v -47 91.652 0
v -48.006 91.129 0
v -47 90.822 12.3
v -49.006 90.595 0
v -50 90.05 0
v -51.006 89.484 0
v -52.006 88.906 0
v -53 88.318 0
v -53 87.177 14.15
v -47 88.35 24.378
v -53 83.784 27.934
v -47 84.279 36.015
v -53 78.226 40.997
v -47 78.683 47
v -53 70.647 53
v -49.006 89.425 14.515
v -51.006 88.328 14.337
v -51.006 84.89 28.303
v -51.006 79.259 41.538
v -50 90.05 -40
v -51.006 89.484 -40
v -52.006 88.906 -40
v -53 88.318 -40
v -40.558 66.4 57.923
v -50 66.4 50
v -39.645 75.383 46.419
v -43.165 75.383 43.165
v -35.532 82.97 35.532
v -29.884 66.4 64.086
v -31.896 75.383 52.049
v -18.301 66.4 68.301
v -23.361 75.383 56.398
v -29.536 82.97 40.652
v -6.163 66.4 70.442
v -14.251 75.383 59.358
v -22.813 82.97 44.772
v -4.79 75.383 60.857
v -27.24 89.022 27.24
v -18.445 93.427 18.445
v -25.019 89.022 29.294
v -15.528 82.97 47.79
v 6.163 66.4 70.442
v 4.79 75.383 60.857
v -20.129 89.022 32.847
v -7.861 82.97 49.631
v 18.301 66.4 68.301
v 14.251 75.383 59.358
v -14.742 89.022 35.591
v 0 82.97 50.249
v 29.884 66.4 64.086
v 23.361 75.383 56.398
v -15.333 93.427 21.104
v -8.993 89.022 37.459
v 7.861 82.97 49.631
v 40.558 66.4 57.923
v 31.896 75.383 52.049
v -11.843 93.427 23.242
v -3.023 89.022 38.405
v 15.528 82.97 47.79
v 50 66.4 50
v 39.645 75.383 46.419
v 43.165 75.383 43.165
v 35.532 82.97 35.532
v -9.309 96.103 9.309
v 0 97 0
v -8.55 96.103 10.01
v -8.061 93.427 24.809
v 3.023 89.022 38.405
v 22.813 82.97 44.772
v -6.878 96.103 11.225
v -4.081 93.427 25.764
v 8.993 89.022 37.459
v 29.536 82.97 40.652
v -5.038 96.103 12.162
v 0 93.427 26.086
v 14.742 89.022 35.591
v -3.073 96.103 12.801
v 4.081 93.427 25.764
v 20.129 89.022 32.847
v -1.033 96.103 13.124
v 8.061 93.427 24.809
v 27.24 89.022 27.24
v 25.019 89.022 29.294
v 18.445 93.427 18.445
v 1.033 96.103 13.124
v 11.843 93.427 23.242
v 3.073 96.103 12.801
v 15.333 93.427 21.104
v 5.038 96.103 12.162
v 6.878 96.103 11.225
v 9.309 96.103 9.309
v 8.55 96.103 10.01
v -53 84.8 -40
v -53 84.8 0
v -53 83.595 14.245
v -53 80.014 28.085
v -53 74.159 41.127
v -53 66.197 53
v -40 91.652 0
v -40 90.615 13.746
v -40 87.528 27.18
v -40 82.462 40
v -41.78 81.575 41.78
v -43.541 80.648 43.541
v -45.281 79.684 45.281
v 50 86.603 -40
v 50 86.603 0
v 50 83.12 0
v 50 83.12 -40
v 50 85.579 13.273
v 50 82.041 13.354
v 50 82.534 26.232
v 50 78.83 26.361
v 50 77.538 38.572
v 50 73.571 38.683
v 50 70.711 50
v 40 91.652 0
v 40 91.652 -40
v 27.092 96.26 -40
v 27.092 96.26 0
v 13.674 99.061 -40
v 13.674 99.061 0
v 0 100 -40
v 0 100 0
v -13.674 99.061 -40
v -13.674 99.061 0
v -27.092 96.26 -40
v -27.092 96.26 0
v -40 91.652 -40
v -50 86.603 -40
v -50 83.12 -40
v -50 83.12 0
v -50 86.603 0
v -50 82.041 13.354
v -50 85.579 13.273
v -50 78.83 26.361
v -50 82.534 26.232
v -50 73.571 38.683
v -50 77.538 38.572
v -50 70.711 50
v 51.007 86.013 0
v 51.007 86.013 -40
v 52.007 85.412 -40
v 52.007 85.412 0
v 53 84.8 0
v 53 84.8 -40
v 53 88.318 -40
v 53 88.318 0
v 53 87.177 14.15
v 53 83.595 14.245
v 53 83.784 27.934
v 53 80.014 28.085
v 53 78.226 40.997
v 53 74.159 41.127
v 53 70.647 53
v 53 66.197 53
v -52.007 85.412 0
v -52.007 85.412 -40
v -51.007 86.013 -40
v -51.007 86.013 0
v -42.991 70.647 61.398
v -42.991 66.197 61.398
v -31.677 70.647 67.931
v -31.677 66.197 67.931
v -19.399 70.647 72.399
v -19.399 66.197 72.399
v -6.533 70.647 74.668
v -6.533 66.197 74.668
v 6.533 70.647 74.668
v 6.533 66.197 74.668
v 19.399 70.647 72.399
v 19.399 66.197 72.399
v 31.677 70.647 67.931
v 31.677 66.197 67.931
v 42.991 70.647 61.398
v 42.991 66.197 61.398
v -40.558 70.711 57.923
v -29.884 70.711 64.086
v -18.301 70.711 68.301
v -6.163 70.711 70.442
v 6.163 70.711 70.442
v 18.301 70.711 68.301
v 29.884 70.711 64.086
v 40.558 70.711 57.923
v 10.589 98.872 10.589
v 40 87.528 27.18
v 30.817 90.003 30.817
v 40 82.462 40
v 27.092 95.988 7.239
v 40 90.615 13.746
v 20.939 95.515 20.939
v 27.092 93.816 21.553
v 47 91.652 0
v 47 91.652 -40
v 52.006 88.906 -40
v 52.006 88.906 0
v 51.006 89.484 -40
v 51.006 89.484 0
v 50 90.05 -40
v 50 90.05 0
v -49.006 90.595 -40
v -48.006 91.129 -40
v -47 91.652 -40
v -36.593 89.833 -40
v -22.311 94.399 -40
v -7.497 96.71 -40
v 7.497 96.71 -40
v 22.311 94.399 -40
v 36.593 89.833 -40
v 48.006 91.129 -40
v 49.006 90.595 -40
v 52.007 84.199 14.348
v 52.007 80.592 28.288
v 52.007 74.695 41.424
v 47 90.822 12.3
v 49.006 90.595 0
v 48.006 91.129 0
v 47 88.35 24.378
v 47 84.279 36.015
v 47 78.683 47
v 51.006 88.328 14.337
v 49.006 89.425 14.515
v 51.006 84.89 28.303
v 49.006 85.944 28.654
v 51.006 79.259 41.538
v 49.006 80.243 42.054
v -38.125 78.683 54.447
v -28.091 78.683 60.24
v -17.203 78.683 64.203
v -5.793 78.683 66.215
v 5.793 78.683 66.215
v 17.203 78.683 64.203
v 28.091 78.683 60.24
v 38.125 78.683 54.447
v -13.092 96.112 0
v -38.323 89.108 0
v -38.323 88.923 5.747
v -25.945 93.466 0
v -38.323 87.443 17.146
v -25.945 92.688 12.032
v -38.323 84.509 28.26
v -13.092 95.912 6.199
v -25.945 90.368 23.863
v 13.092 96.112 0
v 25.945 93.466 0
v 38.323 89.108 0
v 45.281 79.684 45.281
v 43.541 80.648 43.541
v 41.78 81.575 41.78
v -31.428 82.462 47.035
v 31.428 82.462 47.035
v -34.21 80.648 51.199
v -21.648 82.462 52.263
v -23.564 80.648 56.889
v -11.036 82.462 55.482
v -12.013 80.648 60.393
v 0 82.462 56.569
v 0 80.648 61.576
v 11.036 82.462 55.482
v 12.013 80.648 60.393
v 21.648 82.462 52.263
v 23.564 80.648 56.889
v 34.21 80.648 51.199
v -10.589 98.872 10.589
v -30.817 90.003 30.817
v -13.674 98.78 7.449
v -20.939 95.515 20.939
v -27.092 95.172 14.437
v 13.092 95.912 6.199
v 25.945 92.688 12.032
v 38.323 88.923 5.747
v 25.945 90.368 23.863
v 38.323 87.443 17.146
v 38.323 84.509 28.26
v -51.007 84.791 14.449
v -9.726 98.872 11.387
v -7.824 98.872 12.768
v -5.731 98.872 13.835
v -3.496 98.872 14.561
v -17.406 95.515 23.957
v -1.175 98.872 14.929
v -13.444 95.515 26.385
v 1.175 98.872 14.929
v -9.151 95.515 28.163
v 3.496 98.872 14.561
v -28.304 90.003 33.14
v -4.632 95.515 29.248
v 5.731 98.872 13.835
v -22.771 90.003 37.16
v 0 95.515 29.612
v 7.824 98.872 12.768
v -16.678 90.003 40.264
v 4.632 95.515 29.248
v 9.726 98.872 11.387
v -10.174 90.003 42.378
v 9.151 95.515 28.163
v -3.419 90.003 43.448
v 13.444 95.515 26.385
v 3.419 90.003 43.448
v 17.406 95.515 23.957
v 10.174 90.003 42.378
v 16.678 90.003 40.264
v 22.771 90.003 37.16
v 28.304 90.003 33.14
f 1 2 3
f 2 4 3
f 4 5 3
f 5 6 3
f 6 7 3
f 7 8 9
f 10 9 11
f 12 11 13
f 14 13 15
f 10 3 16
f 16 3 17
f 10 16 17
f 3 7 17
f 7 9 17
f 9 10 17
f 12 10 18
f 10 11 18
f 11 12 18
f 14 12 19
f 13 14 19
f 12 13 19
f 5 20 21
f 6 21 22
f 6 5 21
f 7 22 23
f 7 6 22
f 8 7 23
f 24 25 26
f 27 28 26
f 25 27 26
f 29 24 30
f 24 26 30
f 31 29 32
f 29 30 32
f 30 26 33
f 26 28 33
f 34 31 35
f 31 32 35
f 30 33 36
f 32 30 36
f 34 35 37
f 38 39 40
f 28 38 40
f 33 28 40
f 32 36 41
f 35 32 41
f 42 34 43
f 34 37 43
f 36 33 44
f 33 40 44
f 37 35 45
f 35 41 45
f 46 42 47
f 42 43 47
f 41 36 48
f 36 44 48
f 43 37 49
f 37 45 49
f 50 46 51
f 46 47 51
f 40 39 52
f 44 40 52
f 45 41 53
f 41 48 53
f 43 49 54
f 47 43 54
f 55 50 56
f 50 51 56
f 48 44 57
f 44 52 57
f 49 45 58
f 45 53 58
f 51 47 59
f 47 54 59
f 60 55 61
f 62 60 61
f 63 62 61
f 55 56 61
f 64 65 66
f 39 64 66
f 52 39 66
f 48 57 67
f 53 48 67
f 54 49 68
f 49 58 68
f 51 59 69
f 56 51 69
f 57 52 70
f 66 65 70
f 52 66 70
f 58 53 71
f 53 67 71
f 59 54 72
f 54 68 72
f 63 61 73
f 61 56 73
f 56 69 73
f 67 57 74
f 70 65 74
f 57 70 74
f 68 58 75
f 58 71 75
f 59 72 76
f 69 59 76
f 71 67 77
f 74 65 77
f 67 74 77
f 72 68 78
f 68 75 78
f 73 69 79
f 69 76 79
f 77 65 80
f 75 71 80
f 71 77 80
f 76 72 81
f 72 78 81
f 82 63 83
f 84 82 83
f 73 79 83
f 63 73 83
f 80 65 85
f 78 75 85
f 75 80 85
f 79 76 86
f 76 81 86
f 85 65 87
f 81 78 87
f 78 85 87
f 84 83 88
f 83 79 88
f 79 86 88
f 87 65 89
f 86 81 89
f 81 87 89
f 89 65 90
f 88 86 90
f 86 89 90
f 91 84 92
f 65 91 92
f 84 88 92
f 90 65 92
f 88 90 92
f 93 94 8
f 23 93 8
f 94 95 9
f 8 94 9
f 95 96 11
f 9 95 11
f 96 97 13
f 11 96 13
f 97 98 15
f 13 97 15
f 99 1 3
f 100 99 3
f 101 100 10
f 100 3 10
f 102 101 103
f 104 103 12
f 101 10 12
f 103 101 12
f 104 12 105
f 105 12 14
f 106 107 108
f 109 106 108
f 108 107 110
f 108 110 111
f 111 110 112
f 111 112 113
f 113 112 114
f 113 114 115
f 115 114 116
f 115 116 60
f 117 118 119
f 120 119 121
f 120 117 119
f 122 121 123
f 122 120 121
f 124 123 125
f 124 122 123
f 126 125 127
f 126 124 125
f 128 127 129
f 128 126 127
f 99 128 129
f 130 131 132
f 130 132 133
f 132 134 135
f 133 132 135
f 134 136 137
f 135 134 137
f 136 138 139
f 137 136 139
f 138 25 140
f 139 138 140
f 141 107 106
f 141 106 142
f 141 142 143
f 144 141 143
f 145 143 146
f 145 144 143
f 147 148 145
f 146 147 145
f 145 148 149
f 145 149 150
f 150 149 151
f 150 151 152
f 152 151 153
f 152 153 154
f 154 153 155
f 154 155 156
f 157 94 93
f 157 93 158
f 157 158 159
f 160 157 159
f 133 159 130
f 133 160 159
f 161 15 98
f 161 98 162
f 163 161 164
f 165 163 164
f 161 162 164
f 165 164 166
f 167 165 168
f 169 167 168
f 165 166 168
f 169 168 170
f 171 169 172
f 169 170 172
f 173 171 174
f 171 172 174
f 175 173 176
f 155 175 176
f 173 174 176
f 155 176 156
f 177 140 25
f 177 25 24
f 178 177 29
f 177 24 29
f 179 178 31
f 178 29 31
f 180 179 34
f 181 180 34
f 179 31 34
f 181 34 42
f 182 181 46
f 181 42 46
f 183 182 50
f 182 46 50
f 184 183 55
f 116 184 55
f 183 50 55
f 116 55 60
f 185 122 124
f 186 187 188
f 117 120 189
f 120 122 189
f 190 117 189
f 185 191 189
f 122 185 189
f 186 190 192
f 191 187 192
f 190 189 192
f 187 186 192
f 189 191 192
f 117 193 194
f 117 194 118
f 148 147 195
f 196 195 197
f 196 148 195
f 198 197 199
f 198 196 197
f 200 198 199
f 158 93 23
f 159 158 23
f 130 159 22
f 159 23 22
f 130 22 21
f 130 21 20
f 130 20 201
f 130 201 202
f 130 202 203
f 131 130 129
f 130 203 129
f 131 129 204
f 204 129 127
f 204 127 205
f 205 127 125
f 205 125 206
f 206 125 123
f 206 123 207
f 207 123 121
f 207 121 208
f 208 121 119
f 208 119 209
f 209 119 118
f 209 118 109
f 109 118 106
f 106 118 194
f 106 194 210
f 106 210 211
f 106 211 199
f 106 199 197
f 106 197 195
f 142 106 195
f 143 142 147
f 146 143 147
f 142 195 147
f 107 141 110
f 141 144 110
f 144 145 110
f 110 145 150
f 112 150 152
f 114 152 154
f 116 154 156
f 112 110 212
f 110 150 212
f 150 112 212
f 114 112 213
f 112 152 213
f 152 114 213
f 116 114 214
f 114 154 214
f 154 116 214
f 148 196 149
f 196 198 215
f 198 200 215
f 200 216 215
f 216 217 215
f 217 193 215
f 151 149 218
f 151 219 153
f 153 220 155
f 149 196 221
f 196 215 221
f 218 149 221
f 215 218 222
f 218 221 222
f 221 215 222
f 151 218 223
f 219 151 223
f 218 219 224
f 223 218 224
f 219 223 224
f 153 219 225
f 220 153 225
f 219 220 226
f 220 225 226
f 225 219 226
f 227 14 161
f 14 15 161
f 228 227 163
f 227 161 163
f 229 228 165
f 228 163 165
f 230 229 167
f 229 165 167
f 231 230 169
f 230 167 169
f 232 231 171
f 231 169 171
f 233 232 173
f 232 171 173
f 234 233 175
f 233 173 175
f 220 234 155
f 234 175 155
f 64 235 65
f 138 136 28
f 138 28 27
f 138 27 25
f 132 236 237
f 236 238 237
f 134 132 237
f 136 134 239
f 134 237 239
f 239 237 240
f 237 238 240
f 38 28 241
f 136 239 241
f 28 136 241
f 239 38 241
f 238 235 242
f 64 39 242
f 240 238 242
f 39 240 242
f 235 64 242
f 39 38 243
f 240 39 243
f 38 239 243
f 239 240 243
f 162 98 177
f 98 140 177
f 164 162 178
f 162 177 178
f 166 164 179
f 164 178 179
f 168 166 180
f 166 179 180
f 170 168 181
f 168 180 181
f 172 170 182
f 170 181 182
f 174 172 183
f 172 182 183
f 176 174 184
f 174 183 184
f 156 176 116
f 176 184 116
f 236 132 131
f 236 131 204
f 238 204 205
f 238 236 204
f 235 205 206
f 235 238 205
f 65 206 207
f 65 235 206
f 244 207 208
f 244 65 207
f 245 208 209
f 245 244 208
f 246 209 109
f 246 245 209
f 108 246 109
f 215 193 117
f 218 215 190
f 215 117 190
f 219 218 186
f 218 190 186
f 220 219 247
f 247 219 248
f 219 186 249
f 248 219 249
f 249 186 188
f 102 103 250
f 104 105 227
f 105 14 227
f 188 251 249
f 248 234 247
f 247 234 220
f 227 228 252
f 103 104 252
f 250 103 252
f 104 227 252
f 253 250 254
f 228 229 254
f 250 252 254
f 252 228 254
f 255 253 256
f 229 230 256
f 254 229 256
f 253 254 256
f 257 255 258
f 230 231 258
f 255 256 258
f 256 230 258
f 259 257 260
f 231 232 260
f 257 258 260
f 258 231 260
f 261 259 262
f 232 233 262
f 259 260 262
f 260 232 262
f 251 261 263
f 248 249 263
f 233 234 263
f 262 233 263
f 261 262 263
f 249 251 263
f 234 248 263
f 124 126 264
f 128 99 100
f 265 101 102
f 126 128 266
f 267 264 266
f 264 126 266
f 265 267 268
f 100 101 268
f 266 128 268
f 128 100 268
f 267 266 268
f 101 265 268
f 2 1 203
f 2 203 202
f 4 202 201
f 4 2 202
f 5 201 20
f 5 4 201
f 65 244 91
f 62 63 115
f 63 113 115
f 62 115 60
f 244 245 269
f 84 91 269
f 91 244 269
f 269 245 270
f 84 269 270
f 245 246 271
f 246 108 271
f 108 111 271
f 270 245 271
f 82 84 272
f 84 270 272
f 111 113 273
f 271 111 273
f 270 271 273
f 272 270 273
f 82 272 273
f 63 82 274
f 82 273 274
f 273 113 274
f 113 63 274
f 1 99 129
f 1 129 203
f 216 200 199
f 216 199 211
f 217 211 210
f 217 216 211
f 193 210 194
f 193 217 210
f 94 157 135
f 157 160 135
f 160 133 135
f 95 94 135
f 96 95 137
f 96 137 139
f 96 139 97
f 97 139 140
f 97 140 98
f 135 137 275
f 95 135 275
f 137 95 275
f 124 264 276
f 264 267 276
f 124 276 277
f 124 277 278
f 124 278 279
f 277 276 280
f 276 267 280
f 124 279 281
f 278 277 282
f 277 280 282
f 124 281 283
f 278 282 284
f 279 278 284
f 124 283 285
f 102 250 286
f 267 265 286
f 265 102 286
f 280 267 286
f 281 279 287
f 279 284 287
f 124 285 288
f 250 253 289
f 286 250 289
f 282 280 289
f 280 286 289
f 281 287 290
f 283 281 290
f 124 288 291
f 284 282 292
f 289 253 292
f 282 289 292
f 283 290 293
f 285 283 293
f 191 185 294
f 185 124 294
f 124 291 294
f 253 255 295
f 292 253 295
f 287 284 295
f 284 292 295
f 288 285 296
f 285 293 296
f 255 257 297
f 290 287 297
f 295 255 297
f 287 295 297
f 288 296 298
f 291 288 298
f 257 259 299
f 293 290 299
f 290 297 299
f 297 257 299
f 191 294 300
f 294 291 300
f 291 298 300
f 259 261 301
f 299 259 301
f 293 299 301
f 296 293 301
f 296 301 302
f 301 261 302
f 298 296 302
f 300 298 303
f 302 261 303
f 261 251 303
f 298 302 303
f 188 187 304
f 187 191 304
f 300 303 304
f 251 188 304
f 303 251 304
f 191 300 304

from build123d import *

# Parameters (mm, degrees)
EXTRUDE_1225_DEPTH     = 40
REVOLVE_1722_ANGLE     = 90
CUT_EXTRUDE_2087_DEPTH = 101
REVOLVE_2693_ANGLE     = 90


with BuildPart() as part:
    # 草图1 → Extrude 1225 (new body)
    with BuildSketch(Plane.XY):
        with BuildLine():
            Line((-50, 86.602540378), (-50, 83.120394609))
            ThreePointArc((-50, 83.120394609), (0, 97), (50, 83.120394609))
            Line((50, 83.120394609), (50, 86.602540378))
            ThreePointArc((50, 86.602540378), (45.070755856, 89.267166229), (40, 91.651513899))
            ThreePointArc((40, 91.651513899), (0, 100), (-40, 91.651513899))
            ThreePointArc((-40, 91.651513899), (-45.070755856, 89.267166229), (-50, 86.602540378))
        make_face()
        with BuildLine():
            ThreePointArc((40, 91.651513899), (45.070755856, 89.267166229), (50, 86.602540378))
            Line((50, 86.602540378), (50, 90.049986119))
            ThreePointArc((50, 90.049986119), (48.506610094, 90.863132112), (47, 91.651513899))
            Line((47, 91.651513899), (40, 91.651513899))
        make_face()
        with BuildLine():
            Line((50, 90.049986119), (50, 86.602540378))
            ThreePointArc((50, 86.602540378), (51.507887751, 85.714278271), (53, 84.799764151))
            Line((53, 84.799764151), (53, 88.317608663))
            ThreePointArc((53, 88.317608663), (51.507283785, 89.196410898), (50, 90.049986119))
        make_face()
        with BuildLine():
            Line((-50, 90.049986119), (-50, 86.602540378))
            ThreePointArc((-50, 86.602540378), (-45.070755856, 89.267166229), (-40, 91.651513899))
            Line((-40, 91.651513899), (-47, 91.651513899))
            ThreePointArc((-47, 91.651513899), (-48.506610094, 90.863132112), (-50, 90.049986119))
        make_face()
        with BuildLine():
            ThreePointArc((-53, 84.799764151), (-51.507887751, 85.714278271), (-50, 86.602540378))
            Line((-50, 86.602540378), (-50, 90.049986119))
            ThreePointArc((-50, 90.049986119), (-51.507283785, 89.196410898), (-53, 88.317608663))
            Line((-53, 88.317608663), (-53, 84.799764151))
        make_face()
    extrude(amount=-EXTRUDE_1225_DEPTH)

    # 草图5 → Revolve 1722 (revolve)
    with BuildSketch(Plane.XY):
        with BuildLine():
            Line((-50, 86.602540378), (-50, 83.120394609))
            ThreePointArc((-50, 83.120394609), (0, 97), (50, 83.120394609))
            Line((50, 83.120394609), (50, 86.602540378))
            ThreePointArc((50, 86.602540378), (51.507887751, 85.714278271), (53, 84.799764151))
            Line((53, 84.799764151), (53, 88.317608663))
            ThreePointArc((53, 88.317608663), (50.027779593, 90.034555971), (47, 91.651513899))
            Line((47, 91.651513899), (40, 91.651513899))
            ThreePointArc((40, 91.651513899), (0, 100), (-40, 91.651513899))
            Line((-40, 91.651513899), (-47, 91.651513899))
            ThreePointArc((-47, 91.651513899), (-50.027779593, 90.034555971), (-53, 88.317608663))
            Line((-53, 88.317608663), (-53, 84.799764151))
            ThreePointArc((-53, 84.799764151), (-51.507887751, 85.714278271), (-50, 86.602540378))
        make_face()
    revolve(axis=Axis((-50, 0, 0), (1, 0, 0)), revolution_arc=REVOLVE_1722_ANGLE)

    # 草图6 → Cut-Extrude 2087 (cut, through all)
    with BuildSketch(Plane(origin=(0, 0, 0), x_dir=(1, 0, 0), z_dir=(0, 1, 0))):
        with BuildLine():
            Line((0, 0), (-84.852813742, -84.852813742))
            ThreePointArc((-84.852813742, -84.852813742), (0, -120), (84.852813742, -84.852813742))
            Line((84.852813742, -84.852813742), (0, 0))
        make_face()
    extrude(amount=CUT_EXTRUDE_2087_DEPTH, mode=Mode.SUBTRACT)

    # 草图7 → Revolve 2693 (revolve)
    with BuildSketch(Plane(origin=(0, 0, 0), x_dir=(0.707106781, 0, -0.707106781), z_dir=(0.707106781, 0, 0.707106781))):
        with BuildLine():
            Line((-74.953318806, 70.647009845), (-74.953318806, 66.196676654))
            ThreePointArc((-74.953318806, 66.196676654), (-72.866961322, 68.486538441), (-70.710678119, 70.710678119))
            Line((-70.710678119, 70.710678119), (-70.710678119, 66.400301204))
            ThreePointArc((-70.710678119, 66.400301204), (-38.52382888, 89.021989466), (0, 97))
            Line((0, 97), (0, 100))
            ThreePointArc((0, 100), (-29.612402374, 95.514949749), (-56.568542495, 82.462112512))
            add(Edge.make_bspline(
                [(-56.568542495, 82.462112512), (-61.63437241, 80.724547186), (-66.468037432, 78.682907928)],
                knots=[5.164022421, 5.164022421, 5.164022421, 5.250846104, 5.250846104, 5.250846104], degree=2, weights=[1, 0.999057854, 1]))
            ThreePointArc((-66.468037432, 78.682907928), (-70.824740836, 74.785400216), (-74.953318806, 70.647009845))
        make_face()
    revolve(axis=Axis((0, 0, 0), (0, 1, 0)), revolution_arc=REVOLVE_2693_ANGLE)


solid = part.part
